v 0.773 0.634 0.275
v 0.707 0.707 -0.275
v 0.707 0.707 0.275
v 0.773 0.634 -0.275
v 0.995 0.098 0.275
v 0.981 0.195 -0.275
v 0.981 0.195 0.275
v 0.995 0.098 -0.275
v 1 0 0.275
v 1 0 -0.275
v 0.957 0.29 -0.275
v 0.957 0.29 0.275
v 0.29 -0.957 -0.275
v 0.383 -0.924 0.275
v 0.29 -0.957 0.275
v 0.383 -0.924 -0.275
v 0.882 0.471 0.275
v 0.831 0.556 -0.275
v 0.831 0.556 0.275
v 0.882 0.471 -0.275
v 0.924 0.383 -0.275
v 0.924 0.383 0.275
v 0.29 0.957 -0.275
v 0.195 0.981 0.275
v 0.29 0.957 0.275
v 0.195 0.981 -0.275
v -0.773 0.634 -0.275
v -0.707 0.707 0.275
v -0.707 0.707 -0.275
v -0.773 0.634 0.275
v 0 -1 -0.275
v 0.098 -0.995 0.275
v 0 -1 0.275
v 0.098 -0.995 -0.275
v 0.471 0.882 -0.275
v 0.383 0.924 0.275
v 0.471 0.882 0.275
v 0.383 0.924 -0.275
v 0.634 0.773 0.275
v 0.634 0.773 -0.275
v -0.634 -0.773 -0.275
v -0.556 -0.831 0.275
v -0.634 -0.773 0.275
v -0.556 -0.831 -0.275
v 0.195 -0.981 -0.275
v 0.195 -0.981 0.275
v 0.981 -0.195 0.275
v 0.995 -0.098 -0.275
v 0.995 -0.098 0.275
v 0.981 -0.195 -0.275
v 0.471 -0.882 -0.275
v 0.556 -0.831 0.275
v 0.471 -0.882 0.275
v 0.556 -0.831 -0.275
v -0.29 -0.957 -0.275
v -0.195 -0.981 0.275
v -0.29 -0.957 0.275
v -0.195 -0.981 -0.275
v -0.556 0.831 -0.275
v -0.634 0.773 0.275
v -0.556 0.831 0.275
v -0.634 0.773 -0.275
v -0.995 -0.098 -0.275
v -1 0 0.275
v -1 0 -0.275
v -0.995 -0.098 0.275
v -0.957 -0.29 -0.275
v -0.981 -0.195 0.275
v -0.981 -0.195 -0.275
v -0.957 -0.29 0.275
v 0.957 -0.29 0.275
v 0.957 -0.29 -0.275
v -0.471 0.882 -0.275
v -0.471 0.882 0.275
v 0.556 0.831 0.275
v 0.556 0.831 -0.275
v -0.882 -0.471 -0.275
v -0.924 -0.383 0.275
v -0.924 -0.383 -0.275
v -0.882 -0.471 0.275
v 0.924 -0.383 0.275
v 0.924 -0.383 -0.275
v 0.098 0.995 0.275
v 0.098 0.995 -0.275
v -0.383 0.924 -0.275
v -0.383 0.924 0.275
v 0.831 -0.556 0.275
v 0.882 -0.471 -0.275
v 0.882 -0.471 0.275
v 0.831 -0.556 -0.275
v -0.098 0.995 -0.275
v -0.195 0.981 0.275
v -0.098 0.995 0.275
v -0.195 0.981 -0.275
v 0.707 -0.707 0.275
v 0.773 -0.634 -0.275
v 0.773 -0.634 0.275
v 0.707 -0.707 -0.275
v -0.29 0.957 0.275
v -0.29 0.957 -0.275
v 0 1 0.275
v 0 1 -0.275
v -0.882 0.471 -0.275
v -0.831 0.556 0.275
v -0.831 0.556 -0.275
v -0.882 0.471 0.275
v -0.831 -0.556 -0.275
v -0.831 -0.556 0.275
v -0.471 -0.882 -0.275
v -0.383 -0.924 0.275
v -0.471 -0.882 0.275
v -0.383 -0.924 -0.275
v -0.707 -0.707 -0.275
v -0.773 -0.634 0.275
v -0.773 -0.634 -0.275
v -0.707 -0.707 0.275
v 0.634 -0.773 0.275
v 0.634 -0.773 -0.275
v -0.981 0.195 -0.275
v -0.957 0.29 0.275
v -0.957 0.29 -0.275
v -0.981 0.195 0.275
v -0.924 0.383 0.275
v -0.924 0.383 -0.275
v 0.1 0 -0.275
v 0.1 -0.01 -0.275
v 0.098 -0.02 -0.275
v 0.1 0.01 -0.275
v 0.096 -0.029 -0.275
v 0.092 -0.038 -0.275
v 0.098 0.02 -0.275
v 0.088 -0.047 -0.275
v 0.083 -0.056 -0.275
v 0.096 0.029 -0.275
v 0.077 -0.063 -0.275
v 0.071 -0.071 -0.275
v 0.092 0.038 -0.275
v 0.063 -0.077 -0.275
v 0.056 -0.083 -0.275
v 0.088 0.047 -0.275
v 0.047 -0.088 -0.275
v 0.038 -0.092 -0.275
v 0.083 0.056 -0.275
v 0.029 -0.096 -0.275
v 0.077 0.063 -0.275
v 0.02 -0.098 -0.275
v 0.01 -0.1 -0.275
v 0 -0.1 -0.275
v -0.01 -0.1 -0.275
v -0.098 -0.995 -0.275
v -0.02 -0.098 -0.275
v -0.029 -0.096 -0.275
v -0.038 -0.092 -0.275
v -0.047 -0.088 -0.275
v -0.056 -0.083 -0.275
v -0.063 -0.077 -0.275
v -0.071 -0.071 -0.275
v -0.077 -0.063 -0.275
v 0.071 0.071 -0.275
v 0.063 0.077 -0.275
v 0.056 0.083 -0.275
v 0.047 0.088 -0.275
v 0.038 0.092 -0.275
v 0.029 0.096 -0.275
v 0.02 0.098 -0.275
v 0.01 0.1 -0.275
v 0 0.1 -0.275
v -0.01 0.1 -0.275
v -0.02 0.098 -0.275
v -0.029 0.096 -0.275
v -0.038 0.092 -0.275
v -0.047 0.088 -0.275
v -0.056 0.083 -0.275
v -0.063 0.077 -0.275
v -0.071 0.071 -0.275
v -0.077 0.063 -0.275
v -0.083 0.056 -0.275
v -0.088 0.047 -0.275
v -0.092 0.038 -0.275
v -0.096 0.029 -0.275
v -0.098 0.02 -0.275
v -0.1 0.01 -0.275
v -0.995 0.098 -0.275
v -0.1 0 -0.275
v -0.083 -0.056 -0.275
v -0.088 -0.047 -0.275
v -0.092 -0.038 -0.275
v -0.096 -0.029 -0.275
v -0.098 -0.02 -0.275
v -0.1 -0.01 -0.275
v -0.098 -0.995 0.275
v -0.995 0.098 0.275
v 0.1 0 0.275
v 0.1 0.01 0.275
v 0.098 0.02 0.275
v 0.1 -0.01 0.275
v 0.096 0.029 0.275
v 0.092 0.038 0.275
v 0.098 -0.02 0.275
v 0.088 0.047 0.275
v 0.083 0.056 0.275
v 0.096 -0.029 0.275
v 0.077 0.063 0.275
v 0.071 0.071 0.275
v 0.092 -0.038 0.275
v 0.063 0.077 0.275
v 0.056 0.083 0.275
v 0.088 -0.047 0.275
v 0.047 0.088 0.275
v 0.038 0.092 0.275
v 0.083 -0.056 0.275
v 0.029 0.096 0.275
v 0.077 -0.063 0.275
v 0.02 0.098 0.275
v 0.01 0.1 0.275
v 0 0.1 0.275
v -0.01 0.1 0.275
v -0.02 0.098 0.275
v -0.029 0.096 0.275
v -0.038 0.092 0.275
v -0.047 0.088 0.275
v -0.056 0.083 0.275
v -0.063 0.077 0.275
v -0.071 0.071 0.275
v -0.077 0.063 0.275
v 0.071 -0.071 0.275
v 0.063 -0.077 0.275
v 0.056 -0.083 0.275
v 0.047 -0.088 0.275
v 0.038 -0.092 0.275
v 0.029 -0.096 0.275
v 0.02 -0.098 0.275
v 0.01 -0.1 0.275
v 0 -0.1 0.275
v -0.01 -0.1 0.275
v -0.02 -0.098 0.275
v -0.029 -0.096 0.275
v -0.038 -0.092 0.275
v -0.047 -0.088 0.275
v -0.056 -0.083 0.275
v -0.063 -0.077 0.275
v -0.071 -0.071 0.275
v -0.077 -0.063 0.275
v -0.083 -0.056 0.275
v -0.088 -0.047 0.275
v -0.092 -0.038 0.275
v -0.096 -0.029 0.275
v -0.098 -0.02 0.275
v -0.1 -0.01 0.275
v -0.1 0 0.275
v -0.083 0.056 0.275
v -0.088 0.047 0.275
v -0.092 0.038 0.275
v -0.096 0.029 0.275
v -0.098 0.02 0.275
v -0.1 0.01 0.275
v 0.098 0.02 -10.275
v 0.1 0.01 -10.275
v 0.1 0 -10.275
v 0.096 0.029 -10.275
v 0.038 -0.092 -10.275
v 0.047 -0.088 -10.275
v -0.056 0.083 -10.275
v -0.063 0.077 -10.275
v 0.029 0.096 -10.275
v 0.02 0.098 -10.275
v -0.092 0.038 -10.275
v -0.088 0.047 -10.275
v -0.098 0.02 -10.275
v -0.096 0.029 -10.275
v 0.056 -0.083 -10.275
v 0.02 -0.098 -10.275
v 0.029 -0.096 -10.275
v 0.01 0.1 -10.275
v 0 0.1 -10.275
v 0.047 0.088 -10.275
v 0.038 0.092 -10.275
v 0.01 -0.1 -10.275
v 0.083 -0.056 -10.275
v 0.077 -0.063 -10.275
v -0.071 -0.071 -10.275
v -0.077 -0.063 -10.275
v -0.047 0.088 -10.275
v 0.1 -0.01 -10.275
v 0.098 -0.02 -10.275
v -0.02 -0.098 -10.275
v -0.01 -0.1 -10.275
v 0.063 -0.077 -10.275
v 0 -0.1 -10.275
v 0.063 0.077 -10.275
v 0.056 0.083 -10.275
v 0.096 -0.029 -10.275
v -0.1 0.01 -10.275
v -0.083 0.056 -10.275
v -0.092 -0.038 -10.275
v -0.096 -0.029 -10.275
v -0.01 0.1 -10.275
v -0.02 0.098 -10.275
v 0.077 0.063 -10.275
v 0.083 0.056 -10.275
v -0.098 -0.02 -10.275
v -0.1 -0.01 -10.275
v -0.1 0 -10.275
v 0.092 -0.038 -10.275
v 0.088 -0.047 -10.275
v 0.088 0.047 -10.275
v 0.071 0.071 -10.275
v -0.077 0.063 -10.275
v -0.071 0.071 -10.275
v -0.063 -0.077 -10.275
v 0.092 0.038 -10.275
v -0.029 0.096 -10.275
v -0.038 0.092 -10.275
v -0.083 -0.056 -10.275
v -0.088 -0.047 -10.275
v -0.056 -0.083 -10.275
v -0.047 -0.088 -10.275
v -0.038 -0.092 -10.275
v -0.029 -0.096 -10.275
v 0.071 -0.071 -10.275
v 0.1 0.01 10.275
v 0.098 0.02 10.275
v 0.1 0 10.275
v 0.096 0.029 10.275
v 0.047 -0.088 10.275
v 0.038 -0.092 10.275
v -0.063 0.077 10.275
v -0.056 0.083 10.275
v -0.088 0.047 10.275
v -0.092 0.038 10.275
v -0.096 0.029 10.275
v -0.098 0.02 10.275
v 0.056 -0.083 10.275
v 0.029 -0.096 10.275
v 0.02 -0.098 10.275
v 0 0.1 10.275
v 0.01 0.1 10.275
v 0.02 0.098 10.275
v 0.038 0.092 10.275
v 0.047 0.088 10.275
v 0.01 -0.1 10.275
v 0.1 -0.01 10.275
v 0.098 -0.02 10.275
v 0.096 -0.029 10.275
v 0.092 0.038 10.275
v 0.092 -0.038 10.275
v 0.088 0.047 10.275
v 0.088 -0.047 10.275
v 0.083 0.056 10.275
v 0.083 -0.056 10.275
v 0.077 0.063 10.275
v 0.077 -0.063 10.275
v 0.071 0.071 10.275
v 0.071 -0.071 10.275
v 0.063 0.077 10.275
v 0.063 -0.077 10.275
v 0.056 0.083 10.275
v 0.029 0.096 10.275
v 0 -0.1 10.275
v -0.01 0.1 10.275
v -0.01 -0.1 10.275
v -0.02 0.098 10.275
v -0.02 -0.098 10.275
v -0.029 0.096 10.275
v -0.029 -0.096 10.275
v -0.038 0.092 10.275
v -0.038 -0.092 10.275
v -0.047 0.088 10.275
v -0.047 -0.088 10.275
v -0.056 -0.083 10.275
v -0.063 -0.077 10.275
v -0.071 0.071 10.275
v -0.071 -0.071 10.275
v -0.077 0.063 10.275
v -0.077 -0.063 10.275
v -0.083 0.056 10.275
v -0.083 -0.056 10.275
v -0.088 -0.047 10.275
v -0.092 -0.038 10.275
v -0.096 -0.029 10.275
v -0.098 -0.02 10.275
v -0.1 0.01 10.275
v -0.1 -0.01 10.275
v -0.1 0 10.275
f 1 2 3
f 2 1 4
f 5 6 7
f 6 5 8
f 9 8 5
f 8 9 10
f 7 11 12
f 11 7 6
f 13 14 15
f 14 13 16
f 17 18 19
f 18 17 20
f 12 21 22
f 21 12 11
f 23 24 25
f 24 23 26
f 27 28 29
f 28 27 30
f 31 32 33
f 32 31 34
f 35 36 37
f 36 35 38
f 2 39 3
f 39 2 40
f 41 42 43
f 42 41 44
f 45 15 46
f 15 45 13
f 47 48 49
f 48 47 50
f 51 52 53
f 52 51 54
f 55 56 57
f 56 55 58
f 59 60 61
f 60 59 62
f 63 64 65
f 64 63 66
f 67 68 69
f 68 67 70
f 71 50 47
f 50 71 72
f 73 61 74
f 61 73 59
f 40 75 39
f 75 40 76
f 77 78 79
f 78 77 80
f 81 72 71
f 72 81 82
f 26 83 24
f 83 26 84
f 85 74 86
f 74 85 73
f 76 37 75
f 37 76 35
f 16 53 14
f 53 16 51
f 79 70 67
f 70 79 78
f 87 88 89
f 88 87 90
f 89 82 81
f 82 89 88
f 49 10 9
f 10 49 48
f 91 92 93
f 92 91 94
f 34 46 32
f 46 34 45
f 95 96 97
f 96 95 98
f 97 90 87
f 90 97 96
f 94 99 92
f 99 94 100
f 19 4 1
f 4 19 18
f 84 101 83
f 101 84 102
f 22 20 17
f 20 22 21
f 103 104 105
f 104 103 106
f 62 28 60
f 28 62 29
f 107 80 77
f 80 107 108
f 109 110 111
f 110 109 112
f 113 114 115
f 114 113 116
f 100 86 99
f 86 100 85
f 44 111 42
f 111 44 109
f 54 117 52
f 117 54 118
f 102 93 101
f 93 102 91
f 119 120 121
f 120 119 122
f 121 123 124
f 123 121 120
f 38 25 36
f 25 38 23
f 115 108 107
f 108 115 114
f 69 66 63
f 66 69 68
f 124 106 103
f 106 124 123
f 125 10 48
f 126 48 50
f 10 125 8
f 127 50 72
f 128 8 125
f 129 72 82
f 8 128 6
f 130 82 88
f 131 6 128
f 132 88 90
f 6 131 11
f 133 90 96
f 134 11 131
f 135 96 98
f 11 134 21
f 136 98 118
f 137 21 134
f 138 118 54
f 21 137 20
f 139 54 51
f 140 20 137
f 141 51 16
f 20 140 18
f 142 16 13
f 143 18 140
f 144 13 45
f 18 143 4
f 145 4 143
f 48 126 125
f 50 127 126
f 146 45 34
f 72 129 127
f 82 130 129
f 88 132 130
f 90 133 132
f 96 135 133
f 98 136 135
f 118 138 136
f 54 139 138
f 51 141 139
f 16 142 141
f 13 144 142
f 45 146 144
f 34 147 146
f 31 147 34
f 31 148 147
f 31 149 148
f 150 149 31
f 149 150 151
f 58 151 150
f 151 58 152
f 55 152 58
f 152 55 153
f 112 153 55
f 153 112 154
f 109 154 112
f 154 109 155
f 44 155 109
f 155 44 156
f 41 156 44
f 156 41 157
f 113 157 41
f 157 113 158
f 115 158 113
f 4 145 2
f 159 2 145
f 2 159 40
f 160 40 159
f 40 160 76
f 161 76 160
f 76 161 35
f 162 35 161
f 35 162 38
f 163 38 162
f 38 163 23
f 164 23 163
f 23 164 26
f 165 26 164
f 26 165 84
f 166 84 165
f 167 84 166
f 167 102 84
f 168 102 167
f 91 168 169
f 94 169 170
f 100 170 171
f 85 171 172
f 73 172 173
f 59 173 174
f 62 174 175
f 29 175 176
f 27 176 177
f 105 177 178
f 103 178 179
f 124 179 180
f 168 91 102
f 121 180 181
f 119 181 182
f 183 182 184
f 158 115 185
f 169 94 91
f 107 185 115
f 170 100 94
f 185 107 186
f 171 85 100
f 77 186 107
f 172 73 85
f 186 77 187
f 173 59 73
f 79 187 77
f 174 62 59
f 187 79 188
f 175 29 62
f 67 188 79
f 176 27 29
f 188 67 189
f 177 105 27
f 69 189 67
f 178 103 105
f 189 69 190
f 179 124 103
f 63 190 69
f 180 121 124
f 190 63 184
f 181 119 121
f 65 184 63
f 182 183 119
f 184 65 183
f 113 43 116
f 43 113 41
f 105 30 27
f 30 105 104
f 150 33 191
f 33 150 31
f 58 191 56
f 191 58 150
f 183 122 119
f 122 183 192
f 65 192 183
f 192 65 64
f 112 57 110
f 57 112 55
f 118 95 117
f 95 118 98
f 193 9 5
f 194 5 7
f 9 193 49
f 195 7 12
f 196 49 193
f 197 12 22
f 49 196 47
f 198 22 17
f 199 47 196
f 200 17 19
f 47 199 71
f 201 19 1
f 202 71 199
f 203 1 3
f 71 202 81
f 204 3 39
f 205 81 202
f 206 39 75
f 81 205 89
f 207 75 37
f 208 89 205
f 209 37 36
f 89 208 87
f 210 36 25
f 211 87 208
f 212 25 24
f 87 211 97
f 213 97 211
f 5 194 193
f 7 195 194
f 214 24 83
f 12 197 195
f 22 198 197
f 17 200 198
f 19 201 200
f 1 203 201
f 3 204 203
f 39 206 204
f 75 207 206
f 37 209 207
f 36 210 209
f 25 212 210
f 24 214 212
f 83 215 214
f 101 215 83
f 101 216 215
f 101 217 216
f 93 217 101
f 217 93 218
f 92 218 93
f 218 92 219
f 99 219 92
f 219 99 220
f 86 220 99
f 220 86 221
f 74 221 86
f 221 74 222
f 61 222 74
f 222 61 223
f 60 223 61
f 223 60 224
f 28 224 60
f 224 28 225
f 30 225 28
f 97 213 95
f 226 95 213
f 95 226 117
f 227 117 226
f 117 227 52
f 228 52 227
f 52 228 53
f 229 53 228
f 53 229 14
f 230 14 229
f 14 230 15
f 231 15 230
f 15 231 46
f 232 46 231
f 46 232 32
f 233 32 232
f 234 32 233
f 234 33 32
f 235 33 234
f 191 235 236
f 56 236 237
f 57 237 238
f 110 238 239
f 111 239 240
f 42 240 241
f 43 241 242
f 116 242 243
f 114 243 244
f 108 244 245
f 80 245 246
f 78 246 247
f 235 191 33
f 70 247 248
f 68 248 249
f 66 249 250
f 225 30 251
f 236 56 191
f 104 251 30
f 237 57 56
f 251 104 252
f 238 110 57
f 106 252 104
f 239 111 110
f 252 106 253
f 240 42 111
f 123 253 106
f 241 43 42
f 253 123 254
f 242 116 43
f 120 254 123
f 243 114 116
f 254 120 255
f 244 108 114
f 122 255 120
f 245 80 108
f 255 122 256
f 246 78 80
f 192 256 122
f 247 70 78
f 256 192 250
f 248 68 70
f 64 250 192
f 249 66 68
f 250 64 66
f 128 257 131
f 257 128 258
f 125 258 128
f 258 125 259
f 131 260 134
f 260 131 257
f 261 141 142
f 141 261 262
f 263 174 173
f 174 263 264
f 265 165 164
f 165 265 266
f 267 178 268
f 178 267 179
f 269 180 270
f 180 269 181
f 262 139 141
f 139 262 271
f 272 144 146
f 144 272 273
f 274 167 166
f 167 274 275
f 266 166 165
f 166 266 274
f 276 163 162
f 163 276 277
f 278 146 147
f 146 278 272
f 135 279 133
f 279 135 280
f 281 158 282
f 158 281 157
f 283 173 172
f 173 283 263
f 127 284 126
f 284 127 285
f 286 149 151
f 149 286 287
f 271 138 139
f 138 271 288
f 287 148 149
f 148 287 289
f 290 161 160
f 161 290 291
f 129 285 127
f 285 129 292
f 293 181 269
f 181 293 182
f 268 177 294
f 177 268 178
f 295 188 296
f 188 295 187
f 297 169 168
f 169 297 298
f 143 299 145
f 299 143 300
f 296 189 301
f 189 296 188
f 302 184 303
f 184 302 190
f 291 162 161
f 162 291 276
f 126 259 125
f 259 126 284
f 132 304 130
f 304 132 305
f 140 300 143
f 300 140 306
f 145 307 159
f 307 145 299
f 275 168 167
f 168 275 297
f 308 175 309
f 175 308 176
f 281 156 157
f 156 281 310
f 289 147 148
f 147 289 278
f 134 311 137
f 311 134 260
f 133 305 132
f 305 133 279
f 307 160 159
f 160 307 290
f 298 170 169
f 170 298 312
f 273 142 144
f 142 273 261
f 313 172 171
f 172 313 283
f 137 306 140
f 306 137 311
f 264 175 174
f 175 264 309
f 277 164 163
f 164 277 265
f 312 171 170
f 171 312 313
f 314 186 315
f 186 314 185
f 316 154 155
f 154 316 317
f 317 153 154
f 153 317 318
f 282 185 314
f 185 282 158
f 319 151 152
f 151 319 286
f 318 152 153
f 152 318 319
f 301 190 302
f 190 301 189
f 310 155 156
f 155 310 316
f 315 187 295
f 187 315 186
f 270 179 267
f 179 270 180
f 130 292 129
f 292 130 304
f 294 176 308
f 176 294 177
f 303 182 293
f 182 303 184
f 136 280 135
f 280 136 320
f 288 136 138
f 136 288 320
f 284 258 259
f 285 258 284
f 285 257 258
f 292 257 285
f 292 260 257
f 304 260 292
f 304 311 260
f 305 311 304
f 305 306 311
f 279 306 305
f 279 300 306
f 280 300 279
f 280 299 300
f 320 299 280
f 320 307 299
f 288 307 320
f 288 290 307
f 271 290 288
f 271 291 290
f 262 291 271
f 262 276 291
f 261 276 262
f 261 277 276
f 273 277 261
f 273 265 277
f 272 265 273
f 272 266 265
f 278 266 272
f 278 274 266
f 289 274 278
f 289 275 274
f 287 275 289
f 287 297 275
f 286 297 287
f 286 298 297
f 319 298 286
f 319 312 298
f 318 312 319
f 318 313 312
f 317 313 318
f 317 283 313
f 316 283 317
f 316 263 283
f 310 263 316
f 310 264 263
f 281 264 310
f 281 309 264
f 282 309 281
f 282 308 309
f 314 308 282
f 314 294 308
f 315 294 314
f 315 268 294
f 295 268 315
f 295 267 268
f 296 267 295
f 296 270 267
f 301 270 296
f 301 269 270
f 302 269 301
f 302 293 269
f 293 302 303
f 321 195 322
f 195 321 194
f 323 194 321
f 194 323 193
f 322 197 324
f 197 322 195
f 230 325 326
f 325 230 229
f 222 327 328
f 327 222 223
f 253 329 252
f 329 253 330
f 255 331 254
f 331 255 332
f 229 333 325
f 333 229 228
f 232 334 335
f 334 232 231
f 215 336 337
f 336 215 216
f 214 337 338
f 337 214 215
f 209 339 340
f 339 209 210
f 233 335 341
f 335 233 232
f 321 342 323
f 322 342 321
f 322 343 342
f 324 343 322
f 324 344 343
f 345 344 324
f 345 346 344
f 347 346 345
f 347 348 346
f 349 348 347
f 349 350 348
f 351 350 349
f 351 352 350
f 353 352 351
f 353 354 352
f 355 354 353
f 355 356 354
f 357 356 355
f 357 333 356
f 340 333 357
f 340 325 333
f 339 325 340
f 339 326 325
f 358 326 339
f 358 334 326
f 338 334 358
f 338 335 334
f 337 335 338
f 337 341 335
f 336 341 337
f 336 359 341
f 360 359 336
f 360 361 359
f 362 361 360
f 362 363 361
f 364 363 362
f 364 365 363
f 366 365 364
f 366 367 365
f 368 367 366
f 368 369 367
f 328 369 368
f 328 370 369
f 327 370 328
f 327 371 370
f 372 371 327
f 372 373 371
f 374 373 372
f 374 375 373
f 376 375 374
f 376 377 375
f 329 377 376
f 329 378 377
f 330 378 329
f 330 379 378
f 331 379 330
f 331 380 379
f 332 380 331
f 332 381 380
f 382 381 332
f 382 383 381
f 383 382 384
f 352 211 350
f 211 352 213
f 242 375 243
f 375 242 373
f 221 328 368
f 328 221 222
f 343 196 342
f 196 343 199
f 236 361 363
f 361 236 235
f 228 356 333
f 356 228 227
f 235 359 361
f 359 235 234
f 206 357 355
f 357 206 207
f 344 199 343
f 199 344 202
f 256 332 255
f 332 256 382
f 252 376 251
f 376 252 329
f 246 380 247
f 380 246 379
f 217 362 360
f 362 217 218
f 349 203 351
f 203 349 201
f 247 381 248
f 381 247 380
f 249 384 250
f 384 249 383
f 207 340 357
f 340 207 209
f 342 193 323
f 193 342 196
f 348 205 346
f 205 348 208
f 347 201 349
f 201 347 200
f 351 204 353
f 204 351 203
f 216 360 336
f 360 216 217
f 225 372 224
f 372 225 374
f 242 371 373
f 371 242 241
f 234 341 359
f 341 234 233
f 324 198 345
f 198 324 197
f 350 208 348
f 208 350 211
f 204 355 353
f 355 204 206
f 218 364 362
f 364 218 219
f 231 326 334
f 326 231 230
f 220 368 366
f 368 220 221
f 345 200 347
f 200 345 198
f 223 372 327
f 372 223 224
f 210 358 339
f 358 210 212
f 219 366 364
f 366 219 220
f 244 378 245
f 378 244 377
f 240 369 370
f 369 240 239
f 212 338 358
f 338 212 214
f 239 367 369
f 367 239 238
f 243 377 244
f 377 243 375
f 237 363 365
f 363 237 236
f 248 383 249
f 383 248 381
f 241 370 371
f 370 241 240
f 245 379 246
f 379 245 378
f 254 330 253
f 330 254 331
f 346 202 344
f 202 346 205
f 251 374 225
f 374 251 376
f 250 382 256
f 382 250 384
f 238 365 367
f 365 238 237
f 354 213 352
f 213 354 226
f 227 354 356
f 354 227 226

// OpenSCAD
$fn = 64;

// Define the body of the axial component
module axial_body() {
    cylinder(h = 0.55, d = 2, center = true);
}

// Define the leads of the axial component
module lead() {
    cylinder(h = 10, d = 0.2, center = true);
}

// Assemble the axial component with leads
module axial_component() {
    union() {
        axial_body();
        translate([0, 0, -5.275]) lead();
        translate([0, 0, 5.275]) lead();
    }
}

// Render the axial component
axial_component();
